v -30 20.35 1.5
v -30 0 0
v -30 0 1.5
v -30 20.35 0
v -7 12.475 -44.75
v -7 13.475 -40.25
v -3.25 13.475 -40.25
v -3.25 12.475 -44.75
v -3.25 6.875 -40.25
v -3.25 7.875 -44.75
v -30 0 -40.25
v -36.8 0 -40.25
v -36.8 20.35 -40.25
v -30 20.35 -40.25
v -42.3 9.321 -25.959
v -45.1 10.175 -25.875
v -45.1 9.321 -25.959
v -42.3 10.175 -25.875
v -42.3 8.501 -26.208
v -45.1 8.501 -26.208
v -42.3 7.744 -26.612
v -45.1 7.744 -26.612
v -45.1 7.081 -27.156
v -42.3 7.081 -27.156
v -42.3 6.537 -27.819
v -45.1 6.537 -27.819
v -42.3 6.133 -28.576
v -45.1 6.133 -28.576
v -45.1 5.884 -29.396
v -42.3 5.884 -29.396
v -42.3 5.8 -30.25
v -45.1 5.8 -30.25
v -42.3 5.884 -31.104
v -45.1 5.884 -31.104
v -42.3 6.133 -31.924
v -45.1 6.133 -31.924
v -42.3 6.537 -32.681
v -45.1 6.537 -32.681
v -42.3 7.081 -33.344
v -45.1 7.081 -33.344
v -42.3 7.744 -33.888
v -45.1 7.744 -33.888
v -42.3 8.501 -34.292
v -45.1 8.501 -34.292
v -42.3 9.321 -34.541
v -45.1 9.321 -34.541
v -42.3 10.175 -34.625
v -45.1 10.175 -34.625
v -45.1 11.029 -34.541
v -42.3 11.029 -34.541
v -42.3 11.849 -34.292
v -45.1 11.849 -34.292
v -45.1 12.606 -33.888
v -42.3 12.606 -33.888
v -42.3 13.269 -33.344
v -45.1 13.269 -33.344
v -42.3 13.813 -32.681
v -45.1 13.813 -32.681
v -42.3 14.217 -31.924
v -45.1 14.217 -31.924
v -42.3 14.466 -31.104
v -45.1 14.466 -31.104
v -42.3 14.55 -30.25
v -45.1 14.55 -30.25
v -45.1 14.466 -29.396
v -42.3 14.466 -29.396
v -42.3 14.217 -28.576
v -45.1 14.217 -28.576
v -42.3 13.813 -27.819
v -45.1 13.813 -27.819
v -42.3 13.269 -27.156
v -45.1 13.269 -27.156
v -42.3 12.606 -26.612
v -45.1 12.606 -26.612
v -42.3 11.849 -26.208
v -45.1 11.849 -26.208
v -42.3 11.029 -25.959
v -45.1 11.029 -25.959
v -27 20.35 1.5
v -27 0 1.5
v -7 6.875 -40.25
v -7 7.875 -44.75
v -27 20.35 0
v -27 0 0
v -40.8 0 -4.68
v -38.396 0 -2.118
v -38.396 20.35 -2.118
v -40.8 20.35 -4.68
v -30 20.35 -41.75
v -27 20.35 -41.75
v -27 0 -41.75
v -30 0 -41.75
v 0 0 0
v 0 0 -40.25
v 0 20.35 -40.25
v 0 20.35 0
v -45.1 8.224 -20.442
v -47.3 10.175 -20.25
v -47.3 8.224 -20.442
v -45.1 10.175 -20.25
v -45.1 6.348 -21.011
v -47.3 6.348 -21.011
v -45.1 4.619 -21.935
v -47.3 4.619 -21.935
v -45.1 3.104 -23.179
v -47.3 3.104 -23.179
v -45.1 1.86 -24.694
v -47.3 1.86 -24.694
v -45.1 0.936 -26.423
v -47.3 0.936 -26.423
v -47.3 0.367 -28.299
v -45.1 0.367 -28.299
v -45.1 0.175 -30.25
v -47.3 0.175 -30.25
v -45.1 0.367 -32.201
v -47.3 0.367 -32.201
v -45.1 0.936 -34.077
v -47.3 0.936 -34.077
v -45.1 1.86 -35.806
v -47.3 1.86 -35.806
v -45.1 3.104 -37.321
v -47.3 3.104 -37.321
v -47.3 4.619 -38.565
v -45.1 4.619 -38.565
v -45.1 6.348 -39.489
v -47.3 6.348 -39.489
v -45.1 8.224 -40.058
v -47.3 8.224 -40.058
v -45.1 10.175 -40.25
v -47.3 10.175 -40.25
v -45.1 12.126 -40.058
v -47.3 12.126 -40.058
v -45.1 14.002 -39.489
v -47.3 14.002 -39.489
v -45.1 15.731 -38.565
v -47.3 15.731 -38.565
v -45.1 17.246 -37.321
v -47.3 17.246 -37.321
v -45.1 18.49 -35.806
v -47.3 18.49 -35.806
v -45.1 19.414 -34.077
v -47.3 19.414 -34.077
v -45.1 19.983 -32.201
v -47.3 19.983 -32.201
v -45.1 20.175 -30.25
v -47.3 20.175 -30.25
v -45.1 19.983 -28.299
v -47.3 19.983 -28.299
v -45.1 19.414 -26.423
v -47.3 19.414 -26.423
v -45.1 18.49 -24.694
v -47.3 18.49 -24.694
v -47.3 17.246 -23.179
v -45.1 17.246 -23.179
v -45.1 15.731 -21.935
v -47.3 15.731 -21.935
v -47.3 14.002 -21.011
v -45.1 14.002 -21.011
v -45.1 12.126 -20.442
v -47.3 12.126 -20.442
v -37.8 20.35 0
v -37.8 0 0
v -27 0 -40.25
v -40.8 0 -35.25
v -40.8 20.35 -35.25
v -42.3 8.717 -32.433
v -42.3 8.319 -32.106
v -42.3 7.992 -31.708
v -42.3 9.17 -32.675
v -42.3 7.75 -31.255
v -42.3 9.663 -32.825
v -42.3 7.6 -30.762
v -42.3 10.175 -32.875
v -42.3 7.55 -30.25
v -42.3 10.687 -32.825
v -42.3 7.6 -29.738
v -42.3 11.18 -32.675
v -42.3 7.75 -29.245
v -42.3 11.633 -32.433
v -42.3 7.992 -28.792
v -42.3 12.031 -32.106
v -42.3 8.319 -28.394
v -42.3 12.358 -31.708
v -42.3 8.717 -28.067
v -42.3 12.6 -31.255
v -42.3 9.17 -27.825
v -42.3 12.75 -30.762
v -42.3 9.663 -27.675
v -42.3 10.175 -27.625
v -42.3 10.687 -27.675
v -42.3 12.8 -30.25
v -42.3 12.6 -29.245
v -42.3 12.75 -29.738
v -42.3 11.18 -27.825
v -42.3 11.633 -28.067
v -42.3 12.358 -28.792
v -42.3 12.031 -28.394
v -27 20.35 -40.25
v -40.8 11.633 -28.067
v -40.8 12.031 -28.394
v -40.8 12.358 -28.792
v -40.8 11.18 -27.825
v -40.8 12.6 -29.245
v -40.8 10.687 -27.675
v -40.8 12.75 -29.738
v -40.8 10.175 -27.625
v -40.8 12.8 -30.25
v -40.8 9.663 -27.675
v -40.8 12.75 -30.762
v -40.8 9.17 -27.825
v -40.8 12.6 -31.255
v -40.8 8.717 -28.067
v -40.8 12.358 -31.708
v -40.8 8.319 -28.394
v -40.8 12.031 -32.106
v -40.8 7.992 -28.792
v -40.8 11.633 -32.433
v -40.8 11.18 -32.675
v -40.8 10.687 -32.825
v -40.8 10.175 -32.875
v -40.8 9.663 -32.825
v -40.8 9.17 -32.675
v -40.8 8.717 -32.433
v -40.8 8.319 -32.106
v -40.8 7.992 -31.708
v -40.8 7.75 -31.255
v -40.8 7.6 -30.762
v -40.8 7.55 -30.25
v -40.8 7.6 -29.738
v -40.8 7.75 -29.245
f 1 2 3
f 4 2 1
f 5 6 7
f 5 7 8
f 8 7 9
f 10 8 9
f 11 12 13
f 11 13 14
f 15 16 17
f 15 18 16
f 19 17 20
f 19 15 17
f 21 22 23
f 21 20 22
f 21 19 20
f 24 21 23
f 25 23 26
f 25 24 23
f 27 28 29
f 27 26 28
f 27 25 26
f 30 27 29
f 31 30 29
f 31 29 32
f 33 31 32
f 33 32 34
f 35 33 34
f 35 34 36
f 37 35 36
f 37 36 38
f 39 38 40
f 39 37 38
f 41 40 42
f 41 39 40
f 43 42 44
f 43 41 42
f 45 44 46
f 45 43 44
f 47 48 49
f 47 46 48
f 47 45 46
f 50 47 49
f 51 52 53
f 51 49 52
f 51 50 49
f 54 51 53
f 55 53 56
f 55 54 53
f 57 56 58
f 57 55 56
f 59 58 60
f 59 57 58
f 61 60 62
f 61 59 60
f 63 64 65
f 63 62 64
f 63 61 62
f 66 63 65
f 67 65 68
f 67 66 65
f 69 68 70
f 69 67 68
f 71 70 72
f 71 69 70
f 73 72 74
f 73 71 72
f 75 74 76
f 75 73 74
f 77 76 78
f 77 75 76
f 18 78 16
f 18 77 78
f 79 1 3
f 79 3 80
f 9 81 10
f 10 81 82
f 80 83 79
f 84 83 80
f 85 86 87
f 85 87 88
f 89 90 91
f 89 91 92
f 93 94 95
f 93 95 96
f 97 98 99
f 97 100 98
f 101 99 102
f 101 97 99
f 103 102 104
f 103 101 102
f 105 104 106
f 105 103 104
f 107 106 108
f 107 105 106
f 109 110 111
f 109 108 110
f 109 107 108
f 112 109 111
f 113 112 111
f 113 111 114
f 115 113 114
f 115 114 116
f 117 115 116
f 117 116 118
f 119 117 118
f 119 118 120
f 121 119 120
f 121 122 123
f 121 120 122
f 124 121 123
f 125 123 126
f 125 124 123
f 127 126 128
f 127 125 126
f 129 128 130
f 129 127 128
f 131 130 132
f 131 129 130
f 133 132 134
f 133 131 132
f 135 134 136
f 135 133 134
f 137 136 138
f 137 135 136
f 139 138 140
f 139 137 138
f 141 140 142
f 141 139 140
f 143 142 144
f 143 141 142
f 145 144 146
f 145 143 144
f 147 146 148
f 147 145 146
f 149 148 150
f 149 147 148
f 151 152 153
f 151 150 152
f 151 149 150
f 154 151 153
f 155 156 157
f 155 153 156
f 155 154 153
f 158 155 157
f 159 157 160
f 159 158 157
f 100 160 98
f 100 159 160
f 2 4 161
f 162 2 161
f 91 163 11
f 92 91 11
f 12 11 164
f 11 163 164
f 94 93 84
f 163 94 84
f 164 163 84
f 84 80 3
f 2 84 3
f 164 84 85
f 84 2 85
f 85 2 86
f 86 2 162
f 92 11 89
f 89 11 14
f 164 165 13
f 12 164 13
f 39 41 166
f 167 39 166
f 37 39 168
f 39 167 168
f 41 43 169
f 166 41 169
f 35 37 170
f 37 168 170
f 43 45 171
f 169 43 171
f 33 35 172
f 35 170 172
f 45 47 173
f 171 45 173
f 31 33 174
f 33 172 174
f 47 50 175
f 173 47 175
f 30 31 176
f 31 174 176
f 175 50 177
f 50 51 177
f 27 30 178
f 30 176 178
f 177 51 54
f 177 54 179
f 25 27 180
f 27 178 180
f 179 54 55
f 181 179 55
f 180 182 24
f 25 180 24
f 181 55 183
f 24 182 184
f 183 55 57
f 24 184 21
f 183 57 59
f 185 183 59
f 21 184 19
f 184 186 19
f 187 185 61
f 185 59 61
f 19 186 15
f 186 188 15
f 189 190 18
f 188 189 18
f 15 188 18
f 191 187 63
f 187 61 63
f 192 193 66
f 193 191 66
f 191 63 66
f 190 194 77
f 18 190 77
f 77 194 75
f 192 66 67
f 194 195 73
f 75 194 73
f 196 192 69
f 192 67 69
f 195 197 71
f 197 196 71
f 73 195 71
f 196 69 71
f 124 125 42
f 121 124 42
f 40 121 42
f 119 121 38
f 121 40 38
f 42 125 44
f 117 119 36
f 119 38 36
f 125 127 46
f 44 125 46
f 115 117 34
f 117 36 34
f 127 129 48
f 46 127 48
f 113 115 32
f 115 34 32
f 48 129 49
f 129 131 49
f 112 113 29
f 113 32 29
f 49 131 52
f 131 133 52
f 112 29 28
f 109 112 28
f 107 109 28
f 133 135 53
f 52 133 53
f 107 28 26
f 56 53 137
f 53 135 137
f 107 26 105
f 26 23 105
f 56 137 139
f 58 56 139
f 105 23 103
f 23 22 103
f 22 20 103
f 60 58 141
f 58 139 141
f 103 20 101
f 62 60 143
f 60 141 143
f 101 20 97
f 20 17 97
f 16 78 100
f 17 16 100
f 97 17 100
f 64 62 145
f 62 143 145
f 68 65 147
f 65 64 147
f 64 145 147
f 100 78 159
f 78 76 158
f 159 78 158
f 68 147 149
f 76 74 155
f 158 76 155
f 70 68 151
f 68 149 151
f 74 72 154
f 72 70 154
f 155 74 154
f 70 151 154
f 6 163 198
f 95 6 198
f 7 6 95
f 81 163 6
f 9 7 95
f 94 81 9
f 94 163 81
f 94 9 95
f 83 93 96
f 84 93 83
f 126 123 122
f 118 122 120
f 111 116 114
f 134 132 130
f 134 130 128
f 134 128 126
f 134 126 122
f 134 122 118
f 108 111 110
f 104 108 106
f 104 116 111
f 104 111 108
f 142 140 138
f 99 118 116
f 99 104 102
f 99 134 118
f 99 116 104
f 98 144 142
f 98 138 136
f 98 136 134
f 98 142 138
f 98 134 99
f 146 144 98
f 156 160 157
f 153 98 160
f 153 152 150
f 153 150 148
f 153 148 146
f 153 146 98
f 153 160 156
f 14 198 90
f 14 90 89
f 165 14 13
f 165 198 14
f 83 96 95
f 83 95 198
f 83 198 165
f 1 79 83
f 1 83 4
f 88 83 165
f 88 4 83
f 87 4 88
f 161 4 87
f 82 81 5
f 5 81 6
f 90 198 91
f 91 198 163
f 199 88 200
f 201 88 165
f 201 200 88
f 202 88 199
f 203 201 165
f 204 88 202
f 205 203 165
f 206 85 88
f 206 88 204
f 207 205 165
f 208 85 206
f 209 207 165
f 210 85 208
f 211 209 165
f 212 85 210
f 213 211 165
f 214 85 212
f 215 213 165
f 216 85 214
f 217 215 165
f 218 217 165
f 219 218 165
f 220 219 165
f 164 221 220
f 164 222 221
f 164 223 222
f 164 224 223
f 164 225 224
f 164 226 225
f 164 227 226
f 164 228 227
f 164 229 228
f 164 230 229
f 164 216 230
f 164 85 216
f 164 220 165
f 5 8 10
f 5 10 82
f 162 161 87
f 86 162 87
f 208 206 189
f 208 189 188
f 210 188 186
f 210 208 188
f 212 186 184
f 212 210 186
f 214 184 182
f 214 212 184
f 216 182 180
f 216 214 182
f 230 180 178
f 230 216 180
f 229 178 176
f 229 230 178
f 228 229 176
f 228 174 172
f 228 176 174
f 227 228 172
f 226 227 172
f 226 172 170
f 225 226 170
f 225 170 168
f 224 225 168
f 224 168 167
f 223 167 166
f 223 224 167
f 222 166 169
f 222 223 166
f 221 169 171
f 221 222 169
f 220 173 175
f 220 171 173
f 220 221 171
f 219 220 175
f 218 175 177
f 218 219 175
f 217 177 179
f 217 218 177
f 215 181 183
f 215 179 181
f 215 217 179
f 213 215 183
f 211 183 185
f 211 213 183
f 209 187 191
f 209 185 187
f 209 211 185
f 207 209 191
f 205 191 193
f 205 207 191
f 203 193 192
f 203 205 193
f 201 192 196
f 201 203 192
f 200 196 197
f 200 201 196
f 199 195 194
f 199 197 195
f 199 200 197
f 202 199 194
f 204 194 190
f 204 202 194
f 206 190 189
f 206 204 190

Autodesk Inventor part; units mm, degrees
ref_plane "YZ Plane" through (0, 0, 0) normal (1, 0, 0) x (0, 1, 0)
ref_plane "XZ Plane" through (0, 0, 0) normal (0, 1, 0) x (-1, 0, 0)
ref_plane "XY Plane" through (0, 0, 0) normal (0, 0, 1) x (1, 0, 0)
sketch "Sketch1" plane through (0, 0, 0) normal (0, 1, 0) x (-1, 0, 0)
  line L0 (0, 0) -> (40.8, 0)
  line L1 (40.8, 0) -> (40.8, -40.25)
  line L2 (40.8, -40.25) -> (0, -40.25)
  line L3 (0, -40.25) -> (0, 0)
  dimension "d0" = 40.8
  dimension "d1" = 40.25
extrude "Extrusion1" add sketch "Sketch1" along normal blind 20.35
sketch "Sketch2" plane through (0, 20.35, 0) normal (0, 1, 0) x (1, 0, 0)
  line L0 (-40.8, 0) -> (0, 0) projected
  line L1 (-40.8, 0) -> (-40.8, 4.68)
  line L2 (-40.8, 40.25) -> (-40.8, 0) projected
  line L3 (-40.8, 0) -> (-37.8, 0)
  line L4 (-37.8, 0) -> (-38.396, 2.1177)
  line L5 (-38.396, 2.1177) -> (-40.8, 4.68)
  dimension "d4" = 4.68
  dimension "d5" = 3
  dimension "d6" = 2.2
extrude "Extrusion2" cut sketch "Sketch2" against normal blind 20.35
sketch "Sketch3" plane through (0, 20.35, 0) normal (0, 1, 0) x (1, 0, 0)
  line L0 (-40.8, 4.68) -> (-40.8, 40.25) projected
  line L1 (-40.8, 40.25) -> (-36.8, 40.25)
  line L2 (-40.8, 40.25) -> (0, 40.25) projected
  line L3 (-40.8, 40.25) -> (-40.8, 35.25)
  line L4 (-40.8, 35.25) -> (-36.8, 40.25)
  point P0 (0, 0)
  dimension "d9" = 4
  dimension "d10" = 5
extrude "Extrusion3" cut sketch "Sketch3" against normal blind 20.35
sketch "Sketch4" plane through (-40.8, 0, -4.68) normal (-1, 0, 0) x (0, 0, 1)
  circle A0 centre (-25.57, 10.175) radius 2.625
  line L0 (-35.57, 0) -> (-35.57, 20.35) projected
  line L1 (-30.57, 20.35) -> (0, 20.35) projected
  point P0 (4.68, 0)
  dimension "d13" = 5.25
  dimension "d14" = 10
  dimension "d15" = 10.175
extrude "Extrusion4" add sketch "Sketch4" along normal blind 1.5
sketch "Sketch5" plane through (-42.3, 10.175, -30.25) normal (-1, 0, 0) x (0, 0, 1)
  circle A0 centre (0, 0) radius 4.375
  point P0 (30.25, -10.175)
  dimension "d18" = 8.75
extrude "Extrusion5" add sketch "Sketch5" along normal blind 2.8
sketch "Sketch6" plane through (-45.1, 10.175, -30.25) normal (-1, 0, 0) x (0, 0, 1)
  circle A0 centre (0, 0) radius 10
  point P0 (30.25, -10.175)
  dimension "d21" = 20
extrude "Extrusion6" add sketch "Sketch6" along normal blind 2.2
sketch "Sketch7" plane through (0, 0, 0) normal (0, 0, 1) x (1, 0, 0)
  line L0 (-7, 6.875) -> (-3.25, 6.875)
  line L1 (-3.25, 6.875) -> (-3.25, 13.475)
  line L2 (-3.25, 13.475) -> (-7, 13.475)
  line L3 (-7, 13.475) -> (-7, 6.875)
  line L4 (0, 0) -> (0, 20.35) projected
  line L5 (0, 0) -> (-37.8, 0) projected
  dimension "d24" = 3.75
  dimension "d25" = 6.6
  dimension "d26" = 7
  dimension "d27" = 6.875
extrude "Extrusion7" add sketch "Sketch7" along normal blind 4.5
chamfer "Chamfer1" distance 2 angle 45 2 edges at (-5.125, 13.475, 4.5) (-5.125, 6.875, 4.5)
sketch "Sketch8" plane through (-7, 6.875, 0) normal (-1, 0, 0) x (0, 0, 1)
  line L0 (0, 6.6) -> (0, 0) projected
  line L1 (0, 0) -> (0, 6.6)
  line L2 (0, 6.6) -> (2.5, 6.6) projected
  line L3 (0, 6.6) -> (2.5, 6.6)
  line L4 (4.5, 4.6) -> (4.5, 2) projected
  line L5 (2.5, 6.6) -> (4.5, 4.6)
  line L6 (4.5, 4.6) -> (4.5, 2)
  line L7 (4.5, 2) -> (2.5, 0) projected
  line L8 (4.5, 2) -> (2.5, 0)
  line L9 (0, 0) -> (2.5, 0) projected
  line L10 (2.5, 0) -> (0, 0)
  point P0 (0, -6.875)
extrude "Extrusion8" cut sketch "Sketch8" against normal blind 4.5
sketch "Sketch9" plane through (0, 0, -40.25) normal (0, 0, -1) x (-1, 0, 0)
  line L0 (3.25, 6.875) -> (7, 6.875)
  line L1 (7, 6.875) -> (7, 13.475)
  line L2 (7, 13.475) -> (3.25, 13.475)
  line L3 (3.25, 13.475) -> (3.25, 6.875)
  line L4 (0, 20.35) -> (36.8, 20.35) projected
  line L5 (0, 0) -> (0, 20.35) projected
  dimension "d35" = 3.75
  dimension "d36" = 6.6
  dimension "d37" = 6.875
  dimension "d45" = 7
extrude "Extrusion9" add sketch "Sketch9" along normal blind 4.5
chamfer "Chamfer2" distance 1 angle 45 2 edges at (-5.125, 6.875, -44.75) (-5.125, 13.475, -44.75)
sketch "Sketch10" plane through (-7, 6.875, -40.25) normal (-1, 0, 0) x (0, 0, 1)
  line L0 (0, 0) -> (0, 6.6) projected
  line L1 (-4.5, 1) -> (-4.5, 5.6) projected
  line L2 (0, 0) -> (-4.5, 1)
  line L3 (0, 0) -> (-3.5, 0) projected
  line L4 (-4.5, 1) -> (-3.5, 0)
  line L5 (-3.5, 0) -> (0, 0)
  line L6 (0, 6.6) -> (-3.5, 6.6) projected
  line L7 (-4.5, 5.6) -> (-3.5, 6.6)
  line L8 (-3.5, 6.6) -> (0, 6.6)
  line L9 (0, 6.6) -> (-4.5, 5.6)
  point P0 (40.25, -6.875)
extrude "Extrusion10" cut sketch "Sketch10" against normal blind 4.5 contours L3 L4 L2 | L9 L7 L6
sketch "Sketch11" plane through (0, 0, -40.25) normal (0, 0, -1) x (-1, 0, 0)
  line L0 (0, 20.35) -> (36.8, 20.35) projected
  line L1 (27, 0) -> (30, 0)
  line L2 (30, 0) -> (30, 20.35)
  line L3 (30, 20.35) -> (27, 20.35)
  line L4 (27, 20.35) -> (27, 0)
  line L5 (0, 0) -> (0, 20.35) projected
  dimension "d46" = 3
  dimension "d47" = 27
extrude "Extrusion11" add sketch "Sketch11" along normal blind 1.5
sketch "Sketch12" plane through (0, 0, 0) normal (0, 0, 1) x (1, 0, 0)
  line L0 (0, 0) -> (-37.8, 0) projected
  line L1 (0, 20.35) -> (-27, 20.35) projected
  line L2 (-27, 0) -> (-30, 0)
  line L3 (-30, 0) -> (-30, 20.35)
  line L4 (-30, 20.35) -> (-27, 20.35)
  line L5 (-27, 20.35) -> (-27, 0)
  line L6 (0, 0) -> (0, 20.35) projected
  dimension "d50" = 3
  dimension "d51" = 27
extrude "Extrusion12" add sketch "Sketch12" along normal blind 1.5 contours L0 L3 L4 L5
properties part number "DS3218_motor"
